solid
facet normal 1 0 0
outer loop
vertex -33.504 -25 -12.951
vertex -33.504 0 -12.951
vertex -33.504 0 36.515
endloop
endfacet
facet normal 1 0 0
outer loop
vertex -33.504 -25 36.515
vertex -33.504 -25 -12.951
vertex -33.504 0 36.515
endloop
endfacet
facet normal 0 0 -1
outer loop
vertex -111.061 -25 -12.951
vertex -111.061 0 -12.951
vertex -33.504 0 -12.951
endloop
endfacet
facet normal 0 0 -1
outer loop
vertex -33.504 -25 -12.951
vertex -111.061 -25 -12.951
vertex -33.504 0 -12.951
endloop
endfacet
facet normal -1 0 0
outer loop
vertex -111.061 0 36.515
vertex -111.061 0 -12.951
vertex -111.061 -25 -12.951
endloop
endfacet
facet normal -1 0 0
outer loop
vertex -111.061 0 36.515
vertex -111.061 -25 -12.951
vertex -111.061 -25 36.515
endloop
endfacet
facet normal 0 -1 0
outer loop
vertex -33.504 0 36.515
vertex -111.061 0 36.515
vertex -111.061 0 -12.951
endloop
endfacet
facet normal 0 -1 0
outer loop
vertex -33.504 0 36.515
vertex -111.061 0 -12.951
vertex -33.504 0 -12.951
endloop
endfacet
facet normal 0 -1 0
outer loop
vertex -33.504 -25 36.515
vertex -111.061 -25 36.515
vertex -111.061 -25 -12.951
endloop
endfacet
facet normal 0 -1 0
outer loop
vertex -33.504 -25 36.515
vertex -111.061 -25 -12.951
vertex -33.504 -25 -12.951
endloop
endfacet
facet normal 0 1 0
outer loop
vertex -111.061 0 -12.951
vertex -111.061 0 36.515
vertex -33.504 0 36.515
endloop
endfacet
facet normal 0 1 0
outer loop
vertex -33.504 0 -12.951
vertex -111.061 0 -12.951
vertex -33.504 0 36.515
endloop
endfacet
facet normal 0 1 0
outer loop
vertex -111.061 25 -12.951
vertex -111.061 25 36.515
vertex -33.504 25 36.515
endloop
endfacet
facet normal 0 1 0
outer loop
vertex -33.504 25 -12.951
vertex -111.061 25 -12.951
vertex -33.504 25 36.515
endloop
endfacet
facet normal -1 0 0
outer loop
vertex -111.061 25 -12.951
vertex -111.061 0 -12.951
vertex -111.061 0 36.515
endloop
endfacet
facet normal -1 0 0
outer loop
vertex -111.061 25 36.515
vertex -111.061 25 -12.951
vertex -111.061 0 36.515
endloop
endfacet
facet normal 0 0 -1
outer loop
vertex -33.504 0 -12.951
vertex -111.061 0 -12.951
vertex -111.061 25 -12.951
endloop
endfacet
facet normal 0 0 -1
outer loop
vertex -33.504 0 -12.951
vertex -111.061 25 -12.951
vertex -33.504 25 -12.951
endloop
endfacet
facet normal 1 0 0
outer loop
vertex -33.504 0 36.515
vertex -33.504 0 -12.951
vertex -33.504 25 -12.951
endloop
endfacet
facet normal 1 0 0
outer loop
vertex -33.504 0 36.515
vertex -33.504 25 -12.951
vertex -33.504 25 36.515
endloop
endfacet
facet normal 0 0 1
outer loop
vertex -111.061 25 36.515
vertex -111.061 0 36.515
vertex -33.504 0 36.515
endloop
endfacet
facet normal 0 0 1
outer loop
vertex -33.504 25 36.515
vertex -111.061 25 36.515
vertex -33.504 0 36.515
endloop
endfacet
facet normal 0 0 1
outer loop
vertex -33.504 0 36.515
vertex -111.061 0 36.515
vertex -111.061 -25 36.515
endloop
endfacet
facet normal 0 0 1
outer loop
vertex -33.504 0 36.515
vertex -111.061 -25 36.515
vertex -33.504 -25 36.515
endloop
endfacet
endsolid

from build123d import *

# Parameters (mm, degrees)
F0_W     = 77.557534
F0_H     = 49.465844
F1_DEPTH = 25


with BuildPart() as f1:
    # F0 (on Front) → F1 (new body)
    with BuildSketch(Plane.XZ):
        with Locations((-72.282486, 11.782143)):
            Rectangle(F0_W, F0_H)
    extrude(amount=F1_DEPTH)


with BuildPart() as f2_1:
    # F2: instance of F1
    add(f1.part.mirror(Plane.XZ))


solid = Compound([f1.part, f2_1.part])
